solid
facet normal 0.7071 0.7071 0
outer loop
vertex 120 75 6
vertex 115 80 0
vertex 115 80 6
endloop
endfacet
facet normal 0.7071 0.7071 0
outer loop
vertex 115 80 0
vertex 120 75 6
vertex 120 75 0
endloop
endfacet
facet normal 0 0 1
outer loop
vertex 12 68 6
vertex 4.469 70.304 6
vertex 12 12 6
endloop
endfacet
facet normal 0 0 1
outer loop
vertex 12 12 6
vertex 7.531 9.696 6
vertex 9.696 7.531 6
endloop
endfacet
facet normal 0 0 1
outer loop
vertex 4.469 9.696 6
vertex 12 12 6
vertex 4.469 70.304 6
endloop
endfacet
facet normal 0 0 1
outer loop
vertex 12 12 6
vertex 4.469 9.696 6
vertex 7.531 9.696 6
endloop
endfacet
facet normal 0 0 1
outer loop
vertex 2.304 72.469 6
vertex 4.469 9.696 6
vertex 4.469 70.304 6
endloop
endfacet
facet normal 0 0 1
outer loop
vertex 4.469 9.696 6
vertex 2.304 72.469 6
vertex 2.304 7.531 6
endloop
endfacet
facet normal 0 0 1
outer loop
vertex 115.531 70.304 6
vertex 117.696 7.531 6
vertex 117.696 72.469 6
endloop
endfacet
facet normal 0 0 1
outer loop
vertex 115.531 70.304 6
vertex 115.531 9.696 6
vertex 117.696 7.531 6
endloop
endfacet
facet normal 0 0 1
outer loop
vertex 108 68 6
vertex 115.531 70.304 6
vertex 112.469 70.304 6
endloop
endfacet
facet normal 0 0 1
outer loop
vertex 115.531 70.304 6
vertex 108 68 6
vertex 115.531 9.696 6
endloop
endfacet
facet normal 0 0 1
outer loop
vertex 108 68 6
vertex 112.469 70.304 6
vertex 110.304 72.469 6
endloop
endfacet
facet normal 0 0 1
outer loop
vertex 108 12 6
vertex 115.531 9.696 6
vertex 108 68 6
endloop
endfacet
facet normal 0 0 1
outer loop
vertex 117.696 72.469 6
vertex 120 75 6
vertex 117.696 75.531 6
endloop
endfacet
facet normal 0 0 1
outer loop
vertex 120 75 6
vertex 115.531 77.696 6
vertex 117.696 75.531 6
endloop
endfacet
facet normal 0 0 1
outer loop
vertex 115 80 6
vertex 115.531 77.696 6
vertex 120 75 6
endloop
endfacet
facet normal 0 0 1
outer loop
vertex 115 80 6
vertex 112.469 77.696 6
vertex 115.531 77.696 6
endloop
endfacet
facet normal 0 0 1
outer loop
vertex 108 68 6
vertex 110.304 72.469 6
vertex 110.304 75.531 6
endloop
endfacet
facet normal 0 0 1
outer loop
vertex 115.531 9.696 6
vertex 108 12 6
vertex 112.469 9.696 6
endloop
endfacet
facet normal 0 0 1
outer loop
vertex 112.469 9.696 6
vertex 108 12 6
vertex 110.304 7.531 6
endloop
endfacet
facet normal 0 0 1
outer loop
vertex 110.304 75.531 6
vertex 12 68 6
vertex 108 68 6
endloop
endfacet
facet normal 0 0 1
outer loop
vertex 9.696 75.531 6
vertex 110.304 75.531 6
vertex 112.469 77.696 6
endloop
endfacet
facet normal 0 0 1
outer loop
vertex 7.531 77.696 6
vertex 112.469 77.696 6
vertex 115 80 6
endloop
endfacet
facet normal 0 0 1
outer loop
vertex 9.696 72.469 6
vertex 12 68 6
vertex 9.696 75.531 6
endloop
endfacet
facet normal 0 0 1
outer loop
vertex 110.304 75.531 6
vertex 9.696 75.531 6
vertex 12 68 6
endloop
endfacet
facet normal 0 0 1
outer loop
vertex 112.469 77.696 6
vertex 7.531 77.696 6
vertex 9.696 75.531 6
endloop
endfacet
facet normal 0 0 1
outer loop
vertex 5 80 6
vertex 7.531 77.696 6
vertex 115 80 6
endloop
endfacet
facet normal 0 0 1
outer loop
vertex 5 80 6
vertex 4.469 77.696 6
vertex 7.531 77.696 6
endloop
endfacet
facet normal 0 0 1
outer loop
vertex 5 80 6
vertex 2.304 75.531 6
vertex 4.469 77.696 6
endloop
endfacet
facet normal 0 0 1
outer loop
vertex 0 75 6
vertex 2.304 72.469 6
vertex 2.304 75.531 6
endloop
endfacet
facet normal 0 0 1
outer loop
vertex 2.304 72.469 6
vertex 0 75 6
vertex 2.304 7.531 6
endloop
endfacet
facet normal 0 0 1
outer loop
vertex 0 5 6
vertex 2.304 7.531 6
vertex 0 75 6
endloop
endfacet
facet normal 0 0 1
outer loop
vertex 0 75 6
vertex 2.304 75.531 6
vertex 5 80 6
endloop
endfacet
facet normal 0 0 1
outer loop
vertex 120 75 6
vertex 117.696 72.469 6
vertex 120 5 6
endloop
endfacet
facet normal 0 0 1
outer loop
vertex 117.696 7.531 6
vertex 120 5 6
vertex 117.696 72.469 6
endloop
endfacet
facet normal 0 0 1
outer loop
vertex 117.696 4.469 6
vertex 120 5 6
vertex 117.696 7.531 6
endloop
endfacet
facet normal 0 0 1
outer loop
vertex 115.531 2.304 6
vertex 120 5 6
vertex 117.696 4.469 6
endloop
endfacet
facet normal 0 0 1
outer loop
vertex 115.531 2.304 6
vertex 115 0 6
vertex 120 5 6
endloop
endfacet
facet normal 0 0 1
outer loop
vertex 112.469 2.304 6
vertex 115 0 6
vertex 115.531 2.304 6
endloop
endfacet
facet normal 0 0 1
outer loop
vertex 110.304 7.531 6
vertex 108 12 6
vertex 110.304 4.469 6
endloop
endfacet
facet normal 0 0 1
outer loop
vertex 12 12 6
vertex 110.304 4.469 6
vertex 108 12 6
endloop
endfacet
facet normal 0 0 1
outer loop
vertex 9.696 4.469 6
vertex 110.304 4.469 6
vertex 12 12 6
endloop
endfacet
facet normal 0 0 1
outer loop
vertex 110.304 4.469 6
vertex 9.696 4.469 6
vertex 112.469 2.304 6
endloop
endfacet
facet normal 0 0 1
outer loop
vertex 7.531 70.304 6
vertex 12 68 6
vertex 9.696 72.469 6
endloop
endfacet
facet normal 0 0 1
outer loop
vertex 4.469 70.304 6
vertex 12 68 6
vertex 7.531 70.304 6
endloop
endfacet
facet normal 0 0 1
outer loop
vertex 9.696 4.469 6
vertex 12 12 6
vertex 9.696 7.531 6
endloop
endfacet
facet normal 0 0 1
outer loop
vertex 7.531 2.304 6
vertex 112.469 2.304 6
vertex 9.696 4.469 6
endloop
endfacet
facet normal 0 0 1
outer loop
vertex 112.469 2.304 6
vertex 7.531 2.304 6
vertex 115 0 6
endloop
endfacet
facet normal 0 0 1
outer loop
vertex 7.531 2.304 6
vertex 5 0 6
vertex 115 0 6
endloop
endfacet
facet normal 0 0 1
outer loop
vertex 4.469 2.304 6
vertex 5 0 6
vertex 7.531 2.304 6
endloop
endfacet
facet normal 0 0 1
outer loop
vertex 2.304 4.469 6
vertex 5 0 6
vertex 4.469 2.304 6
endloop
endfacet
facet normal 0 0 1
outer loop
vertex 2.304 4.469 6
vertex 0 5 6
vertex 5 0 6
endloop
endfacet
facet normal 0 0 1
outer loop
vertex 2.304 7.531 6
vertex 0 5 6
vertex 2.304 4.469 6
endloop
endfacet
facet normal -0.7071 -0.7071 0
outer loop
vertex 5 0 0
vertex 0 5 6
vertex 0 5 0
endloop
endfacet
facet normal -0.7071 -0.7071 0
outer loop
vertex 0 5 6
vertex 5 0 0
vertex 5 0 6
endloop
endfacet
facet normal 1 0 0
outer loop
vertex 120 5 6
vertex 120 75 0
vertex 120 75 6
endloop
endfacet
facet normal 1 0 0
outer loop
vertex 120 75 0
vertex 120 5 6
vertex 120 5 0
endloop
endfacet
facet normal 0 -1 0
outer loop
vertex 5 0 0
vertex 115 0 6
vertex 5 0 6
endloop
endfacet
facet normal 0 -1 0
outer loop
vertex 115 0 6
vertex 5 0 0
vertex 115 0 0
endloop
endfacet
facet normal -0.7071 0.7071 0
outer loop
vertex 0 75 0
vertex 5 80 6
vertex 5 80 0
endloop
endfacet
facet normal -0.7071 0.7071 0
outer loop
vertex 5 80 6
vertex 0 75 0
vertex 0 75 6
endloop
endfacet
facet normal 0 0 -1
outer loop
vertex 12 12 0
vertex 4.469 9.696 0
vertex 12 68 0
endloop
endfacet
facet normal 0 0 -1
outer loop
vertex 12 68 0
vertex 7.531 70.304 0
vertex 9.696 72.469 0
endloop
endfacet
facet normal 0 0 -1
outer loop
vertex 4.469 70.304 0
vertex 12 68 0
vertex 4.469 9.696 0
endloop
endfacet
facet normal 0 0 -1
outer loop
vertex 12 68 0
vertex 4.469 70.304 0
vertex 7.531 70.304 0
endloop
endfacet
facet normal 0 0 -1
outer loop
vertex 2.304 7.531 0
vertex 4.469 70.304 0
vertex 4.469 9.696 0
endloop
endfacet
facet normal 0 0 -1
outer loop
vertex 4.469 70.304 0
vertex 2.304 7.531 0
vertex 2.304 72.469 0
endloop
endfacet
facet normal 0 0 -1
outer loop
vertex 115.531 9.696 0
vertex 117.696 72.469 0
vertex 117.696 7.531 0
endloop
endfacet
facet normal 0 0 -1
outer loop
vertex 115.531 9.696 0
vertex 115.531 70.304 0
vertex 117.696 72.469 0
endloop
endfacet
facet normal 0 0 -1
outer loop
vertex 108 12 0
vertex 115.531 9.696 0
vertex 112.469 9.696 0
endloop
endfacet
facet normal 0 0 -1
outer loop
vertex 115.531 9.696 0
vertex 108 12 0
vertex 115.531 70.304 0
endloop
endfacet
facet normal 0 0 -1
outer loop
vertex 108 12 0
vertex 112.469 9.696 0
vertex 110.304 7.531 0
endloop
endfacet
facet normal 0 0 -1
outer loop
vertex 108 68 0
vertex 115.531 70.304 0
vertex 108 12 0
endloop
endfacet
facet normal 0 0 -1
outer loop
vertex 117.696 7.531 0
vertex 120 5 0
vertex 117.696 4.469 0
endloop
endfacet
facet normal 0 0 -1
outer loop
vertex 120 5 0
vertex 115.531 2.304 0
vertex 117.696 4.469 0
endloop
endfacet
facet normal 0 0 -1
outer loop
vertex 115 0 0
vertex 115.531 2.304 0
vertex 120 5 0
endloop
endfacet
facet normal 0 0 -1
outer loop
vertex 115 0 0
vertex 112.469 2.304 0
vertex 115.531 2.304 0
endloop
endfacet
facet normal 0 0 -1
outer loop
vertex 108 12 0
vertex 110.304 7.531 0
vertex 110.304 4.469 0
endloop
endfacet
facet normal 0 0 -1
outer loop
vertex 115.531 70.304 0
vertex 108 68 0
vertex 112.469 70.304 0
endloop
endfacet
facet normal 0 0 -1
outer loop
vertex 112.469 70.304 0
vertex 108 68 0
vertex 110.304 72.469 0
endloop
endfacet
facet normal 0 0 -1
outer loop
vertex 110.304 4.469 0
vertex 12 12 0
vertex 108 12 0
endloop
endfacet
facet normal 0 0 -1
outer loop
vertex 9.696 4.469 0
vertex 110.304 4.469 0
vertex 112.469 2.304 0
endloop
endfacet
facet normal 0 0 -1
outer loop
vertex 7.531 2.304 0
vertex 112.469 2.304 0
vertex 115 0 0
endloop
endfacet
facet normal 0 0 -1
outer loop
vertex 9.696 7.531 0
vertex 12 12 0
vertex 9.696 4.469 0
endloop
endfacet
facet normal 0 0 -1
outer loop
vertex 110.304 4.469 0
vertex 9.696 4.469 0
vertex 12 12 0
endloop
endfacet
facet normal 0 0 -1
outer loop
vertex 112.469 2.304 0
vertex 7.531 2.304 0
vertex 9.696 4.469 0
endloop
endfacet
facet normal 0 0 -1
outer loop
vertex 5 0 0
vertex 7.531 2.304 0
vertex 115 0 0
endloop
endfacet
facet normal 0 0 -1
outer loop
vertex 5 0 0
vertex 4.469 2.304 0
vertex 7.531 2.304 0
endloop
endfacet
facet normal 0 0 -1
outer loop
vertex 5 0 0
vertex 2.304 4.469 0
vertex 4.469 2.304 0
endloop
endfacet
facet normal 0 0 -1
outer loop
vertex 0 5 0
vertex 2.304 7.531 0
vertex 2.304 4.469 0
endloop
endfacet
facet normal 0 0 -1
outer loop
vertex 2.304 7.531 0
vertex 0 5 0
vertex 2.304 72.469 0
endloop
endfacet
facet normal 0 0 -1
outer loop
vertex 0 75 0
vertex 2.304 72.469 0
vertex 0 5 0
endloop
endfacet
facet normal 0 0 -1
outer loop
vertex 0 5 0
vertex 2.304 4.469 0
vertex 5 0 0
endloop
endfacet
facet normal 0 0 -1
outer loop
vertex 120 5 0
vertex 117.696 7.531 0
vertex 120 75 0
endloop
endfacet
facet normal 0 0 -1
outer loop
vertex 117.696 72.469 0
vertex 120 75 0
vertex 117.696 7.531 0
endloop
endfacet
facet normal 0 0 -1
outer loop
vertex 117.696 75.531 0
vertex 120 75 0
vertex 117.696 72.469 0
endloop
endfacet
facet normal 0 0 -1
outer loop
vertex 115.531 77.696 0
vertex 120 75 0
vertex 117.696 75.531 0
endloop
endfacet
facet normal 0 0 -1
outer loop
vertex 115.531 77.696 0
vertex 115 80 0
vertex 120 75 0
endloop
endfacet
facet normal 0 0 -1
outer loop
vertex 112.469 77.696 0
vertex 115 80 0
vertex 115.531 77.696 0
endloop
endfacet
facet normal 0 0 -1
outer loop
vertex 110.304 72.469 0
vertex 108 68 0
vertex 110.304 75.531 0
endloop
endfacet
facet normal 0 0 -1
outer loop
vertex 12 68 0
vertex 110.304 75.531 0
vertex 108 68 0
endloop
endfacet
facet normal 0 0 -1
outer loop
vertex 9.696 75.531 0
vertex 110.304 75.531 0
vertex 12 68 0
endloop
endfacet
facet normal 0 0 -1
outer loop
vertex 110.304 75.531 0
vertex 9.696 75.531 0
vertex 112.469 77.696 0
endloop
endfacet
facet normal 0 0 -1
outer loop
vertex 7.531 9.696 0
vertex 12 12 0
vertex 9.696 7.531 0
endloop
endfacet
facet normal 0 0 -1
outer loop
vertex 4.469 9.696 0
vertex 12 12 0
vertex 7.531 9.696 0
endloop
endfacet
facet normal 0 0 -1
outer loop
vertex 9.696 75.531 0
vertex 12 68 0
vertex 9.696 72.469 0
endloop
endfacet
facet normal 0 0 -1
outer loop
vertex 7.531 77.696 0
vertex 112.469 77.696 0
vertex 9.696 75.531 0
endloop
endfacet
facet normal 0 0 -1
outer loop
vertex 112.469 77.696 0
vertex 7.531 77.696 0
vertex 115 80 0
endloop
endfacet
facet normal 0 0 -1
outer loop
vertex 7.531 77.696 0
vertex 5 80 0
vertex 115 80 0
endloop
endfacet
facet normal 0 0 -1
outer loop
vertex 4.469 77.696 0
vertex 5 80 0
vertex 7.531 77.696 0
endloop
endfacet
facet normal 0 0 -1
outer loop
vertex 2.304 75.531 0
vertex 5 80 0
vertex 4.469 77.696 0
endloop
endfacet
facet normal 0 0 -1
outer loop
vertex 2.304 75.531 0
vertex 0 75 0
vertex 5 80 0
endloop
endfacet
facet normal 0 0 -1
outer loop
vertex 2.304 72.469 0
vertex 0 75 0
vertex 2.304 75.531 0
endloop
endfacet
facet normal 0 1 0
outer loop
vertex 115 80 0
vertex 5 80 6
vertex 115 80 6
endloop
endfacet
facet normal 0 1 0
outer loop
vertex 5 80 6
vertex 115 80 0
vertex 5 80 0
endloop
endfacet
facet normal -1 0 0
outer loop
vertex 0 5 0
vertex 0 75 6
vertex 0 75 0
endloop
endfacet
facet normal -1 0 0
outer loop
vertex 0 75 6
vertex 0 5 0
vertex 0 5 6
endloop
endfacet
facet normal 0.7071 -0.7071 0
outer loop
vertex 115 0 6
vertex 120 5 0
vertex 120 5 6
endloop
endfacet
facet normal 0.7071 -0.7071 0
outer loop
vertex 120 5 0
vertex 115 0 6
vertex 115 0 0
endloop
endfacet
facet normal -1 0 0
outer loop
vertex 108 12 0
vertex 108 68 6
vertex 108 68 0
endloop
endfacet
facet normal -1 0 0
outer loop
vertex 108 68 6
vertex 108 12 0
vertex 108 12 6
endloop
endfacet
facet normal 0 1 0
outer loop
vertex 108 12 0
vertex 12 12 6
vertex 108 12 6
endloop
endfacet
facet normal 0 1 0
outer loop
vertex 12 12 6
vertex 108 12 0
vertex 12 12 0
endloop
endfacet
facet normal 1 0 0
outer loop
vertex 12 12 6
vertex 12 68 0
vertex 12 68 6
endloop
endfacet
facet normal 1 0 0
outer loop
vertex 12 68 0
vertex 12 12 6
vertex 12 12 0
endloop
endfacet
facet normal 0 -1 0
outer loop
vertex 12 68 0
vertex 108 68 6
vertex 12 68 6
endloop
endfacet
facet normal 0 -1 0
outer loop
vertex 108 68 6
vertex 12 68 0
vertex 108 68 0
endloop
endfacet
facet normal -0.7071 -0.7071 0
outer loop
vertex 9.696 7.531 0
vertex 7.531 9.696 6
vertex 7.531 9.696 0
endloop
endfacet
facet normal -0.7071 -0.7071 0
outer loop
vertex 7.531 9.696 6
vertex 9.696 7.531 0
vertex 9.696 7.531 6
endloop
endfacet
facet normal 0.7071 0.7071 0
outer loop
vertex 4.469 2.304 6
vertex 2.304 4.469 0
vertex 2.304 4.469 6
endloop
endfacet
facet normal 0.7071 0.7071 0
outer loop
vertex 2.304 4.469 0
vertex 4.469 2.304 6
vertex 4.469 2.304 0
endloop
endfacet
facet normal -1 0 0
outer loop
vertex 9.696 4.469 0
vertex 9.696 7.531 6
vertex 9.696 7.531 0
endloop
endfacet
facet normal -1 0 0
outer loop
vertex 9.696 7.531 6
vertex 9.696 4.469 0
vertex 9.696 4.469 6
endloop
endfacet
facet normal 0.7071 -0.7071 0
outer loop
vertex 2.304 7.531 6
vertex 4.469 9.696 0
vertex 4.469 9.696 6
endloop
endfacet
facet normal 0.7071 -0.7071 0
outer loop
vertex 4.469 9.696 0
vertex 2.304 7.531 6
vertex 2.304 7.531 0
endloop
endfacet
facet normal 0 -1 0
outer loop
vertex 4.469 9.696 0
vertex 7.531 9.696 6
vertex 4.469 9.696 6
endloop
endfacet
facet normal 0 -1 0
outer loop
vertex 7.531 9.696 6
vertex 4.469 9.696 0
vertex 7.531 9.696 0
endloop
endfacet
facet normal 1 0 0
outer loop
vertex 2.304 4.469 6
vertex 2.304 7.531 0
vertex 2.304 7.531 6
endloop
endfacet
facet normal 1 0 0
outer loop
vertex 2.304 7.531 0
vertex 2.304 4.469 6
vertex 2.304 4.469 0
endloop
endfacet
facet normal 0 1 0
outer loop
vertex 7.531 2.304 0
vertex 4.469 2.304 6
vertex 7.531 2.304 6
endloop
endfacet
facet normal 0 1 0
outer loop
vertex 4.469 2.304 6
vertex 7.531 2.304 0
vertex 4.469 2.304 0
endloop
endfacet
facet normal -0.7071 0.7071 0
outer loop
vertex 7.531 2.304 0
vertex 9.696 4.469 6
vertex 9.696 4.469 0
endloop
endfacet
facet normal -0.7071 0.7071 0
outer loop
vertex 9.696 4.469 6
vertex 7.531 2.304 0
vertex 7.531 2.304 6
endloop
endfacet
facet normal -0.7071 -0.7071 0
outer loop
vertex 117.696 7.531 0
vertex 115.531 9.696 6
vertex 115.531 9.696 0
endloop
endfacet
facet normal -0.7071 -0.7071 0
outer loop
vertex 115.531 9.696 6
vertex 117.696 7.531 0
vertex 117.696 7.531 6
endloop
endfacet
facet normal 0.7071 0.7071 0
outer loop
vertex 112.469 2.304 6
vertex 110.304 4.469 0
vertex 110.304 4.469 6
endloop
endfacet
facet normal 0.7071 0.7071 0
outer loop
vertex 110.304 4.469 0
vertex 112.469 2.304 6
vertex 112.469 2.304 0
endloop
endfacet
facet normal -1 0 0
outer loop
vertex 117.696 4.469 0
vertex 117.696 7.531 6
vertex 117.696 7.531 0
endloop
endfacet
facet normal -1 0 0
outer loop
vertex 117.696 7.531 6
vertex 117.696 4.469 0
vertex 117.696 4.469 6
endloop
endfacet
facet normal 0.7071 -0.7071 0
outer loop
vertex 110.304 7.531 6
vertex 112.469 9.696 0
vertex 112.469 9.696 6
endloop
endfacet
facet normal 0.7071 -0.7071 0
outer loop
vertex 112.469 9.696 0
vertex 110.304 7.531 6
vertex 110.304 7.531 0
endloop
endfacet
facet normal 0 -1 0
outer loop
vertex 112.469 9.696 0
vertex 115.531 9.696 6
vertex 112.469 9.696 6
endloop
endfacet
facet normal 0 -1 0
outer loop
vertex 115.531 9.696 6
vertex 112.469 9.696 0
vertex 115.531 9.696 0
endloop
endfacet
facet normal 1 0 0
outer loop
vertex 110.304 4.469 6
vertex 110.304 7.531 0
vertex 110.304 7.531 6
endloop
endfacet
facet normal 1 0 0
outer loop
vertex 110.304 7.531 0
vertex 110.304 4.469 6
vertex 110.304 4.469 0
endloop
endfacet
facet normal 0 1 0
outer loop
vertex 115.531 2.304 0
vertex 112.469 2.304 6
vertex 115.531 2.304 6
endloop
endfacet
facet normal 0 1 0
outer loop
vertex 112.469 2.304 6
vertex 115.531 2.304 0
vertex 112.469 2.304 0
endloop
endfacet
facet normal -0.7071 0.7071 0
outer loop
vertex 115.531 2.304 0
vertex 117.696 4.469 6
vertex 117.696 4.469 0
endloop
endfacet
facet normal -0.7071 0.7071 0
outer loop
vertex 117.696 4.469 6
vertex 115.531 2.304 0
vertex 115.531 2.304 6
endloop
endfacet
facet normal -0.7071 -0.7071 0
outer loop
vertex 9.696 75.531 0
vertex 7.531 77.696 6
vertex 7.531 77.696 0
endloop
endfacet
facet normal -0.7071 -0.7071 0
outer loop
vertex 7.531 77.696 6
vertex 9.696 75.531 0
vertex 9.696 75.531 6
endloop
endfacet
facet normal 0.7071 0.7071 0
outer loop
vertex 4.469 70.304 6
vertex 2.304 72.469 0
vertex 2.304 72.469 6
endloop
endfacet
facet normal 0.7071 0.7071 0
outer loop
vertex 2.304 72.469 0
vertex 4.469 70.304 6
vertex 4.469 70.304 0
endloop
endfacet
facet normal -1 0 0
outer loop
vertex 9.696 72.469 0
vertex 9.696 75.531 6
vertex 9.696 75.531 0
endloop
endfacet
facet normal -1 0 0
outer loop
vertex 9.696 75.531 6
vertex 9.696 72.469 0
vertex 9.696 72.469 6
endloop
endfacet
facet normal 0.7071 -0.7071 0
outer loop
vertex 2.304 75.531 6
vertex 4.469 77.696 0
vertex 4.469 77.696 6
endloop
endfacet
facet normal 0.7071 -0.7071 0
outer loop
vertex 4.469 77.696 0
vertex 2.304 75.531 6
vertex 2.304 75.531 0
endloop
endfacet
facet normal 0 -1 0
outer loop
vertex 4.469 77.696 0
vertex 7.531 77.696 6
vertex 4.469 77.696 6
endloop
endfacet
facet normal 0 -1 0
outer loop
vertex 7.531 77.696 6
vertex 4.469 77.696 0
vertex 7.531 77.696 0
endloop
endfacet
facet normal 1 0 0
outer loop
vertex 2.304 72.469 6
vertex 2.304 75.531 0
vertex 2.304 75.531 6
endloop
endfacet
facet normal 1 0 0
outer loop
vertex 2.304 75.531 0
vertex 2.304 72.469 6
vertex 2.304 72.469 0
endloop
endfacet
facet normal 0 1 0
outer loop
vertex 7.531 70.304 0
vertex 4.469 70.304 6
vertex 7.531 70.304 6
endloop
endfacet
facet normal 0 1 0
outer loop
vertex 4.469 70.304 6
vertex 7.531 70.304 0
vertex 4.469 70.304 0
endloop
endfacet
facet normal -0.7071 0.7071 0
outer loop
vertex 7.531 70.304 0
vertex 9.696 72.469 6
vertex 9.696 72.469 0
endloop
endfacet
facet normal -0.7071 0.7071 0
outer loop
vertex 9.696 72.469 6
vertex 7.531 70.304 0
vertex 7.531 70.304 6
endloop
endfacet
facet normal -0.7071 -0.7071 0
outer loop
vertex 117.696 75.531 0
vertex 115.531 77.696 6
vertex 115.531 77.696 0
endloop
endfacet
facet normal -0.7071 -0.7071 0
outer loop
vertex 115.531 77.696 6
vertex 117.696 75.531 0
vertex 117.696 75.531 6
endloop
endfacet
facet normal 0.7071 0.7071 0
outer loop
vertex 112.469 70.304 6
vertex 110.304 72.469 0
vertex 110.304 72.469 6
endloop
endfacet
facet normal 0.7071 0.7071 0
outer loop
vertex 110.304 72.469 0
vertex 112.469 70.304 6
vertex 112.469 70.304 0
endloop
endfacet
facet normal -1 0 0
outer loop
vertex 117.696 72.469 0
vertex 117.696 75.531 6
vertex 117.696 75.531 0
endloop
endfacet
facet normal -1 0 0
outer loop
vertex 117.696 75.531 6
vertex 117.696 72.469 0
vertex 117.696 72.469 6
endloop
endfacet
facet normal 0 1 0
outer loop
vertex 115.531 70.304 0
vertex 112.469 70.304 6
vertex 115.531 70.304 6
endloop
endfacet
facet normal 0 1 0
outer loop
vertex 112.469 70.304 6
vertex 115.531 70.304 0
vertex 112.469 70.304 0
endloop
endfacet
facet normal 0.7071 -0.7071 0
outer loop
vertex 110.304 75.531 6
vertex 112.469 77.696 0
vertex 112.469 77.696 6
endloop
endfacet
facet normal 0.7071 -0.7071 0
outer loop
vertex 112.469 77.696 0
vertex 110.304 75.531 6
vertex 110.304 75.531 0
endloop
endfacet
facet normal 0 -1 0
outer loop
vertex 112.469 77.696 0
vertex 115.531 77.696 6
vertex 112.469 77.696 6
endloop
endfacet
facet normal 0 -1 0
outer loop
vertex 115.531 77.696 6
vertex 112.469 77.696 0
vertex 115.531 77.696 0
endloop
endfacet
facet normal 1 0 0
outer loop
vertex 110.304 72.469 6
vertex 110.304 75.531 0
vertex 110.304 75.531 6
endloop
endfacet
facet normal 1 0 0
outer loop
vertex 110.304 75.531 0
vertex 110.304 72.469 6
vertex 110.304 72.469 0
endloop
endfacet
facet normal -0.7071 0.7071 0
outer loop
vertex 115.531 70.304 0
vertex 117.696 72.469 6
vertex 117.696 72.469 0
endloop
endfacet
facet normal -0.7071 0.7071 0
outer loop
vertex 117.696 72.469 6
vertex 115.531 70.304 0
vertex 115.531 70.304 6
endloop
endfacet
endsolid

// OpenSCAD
$fn = 32;

// ----------------------------------------------------------------------
// Frame plate: 120 x 80 frame, 12 mm rails
// ----------------------------------------------------------------------

// --- parameters (mm) ---
plate_l = 120;            // plate length, X
plate_w = 80;             // plate width, Y
plate_t = 6;              // plate thickness, Z (extrusion height)
corner_c = 5;             // corner chamfer
frame_bar = 12;           // frame rail width
bolt_r = 4;               // corner bolt window radius
bolt_inset = 6;           // bolt centre inset from the edges
fit_tol = 0.02;           // declared fit tolerance (prompt contract)
free_tol = 0.2;           // declared free tolerance (prompt contract)

win_l = plate_l - 2 * frame_bar;  // window length
win_w = plate_w - 2 * frame_bar;  // window width
bolt_d = 2 * bolt_r;  // corner hole diameter

profile = [[5, 0], [115, 0], [120, 5], [120, 75], [115, 80], [5, 80], [0, 75], [0, 5]];  // primary outline, 8 points, counter clockwise
void_1 = [[12, 12], [108, 12], [108, 68], [12, 68]];  // the window, 4 points
void_2 = [[9.696, 7.531], [7.531, 9.696], [4.469, 9.696], [2.304, 7.531], [2.304, 4.469], [4.469, 2.304], [7.531, 2.304], [9.696, 4.469]];  // corner bolt window, 8 points
void_3 = [[117.696, 7.531], [115.531, 9.696], [112.469, 9.696], [110.304, 7.531], [110.304, 4.469], [112.469, 2.304], [115.531, 2.304], [117.696, 4.469]];  // corner bolt window, 8 points
void_4 = [[9.696, 75.531], [7.531, 77.696], [4.469, 77.696], [2.304, 75.531], [2.304, 72.469], [4.469, 70.304], [7.531, 70.304], [9.696, 72.469]];  // corner bolt window, 8 points
void_5 = [[117.696, 75.531], [115.531, 77.696], [112.469, 77.696], [110.304, 75.531], [110.304, 72.469], [112.469, 70.304], [115.531, 70.304], [117.696, 72.469]];  // corner bolt window, 8 points

// --- the one profile operation ---
difference() {
  linear_extrude(height = plate_t) polygon(points = profile);
  translate([0, 0, -1])
    linear_extrude(height = plate_t + 2) polygon(points = void_1);
  translate([0, 0, -1])
    linear_extrude(height = plate_t + 2) polygon(points = void_2);
  translate([0, 0, -1])
    linear_extrude(height = plate_t + 2) polygon(points = void_3);
  translate([0, 0, -1])
    linear_extrude(height = plate_t + 2) polygon(points = void_4);
  translate([0, 0, -1])
    linear_extrude(height = plate_t + 2) polygon(points = void_5);
}
